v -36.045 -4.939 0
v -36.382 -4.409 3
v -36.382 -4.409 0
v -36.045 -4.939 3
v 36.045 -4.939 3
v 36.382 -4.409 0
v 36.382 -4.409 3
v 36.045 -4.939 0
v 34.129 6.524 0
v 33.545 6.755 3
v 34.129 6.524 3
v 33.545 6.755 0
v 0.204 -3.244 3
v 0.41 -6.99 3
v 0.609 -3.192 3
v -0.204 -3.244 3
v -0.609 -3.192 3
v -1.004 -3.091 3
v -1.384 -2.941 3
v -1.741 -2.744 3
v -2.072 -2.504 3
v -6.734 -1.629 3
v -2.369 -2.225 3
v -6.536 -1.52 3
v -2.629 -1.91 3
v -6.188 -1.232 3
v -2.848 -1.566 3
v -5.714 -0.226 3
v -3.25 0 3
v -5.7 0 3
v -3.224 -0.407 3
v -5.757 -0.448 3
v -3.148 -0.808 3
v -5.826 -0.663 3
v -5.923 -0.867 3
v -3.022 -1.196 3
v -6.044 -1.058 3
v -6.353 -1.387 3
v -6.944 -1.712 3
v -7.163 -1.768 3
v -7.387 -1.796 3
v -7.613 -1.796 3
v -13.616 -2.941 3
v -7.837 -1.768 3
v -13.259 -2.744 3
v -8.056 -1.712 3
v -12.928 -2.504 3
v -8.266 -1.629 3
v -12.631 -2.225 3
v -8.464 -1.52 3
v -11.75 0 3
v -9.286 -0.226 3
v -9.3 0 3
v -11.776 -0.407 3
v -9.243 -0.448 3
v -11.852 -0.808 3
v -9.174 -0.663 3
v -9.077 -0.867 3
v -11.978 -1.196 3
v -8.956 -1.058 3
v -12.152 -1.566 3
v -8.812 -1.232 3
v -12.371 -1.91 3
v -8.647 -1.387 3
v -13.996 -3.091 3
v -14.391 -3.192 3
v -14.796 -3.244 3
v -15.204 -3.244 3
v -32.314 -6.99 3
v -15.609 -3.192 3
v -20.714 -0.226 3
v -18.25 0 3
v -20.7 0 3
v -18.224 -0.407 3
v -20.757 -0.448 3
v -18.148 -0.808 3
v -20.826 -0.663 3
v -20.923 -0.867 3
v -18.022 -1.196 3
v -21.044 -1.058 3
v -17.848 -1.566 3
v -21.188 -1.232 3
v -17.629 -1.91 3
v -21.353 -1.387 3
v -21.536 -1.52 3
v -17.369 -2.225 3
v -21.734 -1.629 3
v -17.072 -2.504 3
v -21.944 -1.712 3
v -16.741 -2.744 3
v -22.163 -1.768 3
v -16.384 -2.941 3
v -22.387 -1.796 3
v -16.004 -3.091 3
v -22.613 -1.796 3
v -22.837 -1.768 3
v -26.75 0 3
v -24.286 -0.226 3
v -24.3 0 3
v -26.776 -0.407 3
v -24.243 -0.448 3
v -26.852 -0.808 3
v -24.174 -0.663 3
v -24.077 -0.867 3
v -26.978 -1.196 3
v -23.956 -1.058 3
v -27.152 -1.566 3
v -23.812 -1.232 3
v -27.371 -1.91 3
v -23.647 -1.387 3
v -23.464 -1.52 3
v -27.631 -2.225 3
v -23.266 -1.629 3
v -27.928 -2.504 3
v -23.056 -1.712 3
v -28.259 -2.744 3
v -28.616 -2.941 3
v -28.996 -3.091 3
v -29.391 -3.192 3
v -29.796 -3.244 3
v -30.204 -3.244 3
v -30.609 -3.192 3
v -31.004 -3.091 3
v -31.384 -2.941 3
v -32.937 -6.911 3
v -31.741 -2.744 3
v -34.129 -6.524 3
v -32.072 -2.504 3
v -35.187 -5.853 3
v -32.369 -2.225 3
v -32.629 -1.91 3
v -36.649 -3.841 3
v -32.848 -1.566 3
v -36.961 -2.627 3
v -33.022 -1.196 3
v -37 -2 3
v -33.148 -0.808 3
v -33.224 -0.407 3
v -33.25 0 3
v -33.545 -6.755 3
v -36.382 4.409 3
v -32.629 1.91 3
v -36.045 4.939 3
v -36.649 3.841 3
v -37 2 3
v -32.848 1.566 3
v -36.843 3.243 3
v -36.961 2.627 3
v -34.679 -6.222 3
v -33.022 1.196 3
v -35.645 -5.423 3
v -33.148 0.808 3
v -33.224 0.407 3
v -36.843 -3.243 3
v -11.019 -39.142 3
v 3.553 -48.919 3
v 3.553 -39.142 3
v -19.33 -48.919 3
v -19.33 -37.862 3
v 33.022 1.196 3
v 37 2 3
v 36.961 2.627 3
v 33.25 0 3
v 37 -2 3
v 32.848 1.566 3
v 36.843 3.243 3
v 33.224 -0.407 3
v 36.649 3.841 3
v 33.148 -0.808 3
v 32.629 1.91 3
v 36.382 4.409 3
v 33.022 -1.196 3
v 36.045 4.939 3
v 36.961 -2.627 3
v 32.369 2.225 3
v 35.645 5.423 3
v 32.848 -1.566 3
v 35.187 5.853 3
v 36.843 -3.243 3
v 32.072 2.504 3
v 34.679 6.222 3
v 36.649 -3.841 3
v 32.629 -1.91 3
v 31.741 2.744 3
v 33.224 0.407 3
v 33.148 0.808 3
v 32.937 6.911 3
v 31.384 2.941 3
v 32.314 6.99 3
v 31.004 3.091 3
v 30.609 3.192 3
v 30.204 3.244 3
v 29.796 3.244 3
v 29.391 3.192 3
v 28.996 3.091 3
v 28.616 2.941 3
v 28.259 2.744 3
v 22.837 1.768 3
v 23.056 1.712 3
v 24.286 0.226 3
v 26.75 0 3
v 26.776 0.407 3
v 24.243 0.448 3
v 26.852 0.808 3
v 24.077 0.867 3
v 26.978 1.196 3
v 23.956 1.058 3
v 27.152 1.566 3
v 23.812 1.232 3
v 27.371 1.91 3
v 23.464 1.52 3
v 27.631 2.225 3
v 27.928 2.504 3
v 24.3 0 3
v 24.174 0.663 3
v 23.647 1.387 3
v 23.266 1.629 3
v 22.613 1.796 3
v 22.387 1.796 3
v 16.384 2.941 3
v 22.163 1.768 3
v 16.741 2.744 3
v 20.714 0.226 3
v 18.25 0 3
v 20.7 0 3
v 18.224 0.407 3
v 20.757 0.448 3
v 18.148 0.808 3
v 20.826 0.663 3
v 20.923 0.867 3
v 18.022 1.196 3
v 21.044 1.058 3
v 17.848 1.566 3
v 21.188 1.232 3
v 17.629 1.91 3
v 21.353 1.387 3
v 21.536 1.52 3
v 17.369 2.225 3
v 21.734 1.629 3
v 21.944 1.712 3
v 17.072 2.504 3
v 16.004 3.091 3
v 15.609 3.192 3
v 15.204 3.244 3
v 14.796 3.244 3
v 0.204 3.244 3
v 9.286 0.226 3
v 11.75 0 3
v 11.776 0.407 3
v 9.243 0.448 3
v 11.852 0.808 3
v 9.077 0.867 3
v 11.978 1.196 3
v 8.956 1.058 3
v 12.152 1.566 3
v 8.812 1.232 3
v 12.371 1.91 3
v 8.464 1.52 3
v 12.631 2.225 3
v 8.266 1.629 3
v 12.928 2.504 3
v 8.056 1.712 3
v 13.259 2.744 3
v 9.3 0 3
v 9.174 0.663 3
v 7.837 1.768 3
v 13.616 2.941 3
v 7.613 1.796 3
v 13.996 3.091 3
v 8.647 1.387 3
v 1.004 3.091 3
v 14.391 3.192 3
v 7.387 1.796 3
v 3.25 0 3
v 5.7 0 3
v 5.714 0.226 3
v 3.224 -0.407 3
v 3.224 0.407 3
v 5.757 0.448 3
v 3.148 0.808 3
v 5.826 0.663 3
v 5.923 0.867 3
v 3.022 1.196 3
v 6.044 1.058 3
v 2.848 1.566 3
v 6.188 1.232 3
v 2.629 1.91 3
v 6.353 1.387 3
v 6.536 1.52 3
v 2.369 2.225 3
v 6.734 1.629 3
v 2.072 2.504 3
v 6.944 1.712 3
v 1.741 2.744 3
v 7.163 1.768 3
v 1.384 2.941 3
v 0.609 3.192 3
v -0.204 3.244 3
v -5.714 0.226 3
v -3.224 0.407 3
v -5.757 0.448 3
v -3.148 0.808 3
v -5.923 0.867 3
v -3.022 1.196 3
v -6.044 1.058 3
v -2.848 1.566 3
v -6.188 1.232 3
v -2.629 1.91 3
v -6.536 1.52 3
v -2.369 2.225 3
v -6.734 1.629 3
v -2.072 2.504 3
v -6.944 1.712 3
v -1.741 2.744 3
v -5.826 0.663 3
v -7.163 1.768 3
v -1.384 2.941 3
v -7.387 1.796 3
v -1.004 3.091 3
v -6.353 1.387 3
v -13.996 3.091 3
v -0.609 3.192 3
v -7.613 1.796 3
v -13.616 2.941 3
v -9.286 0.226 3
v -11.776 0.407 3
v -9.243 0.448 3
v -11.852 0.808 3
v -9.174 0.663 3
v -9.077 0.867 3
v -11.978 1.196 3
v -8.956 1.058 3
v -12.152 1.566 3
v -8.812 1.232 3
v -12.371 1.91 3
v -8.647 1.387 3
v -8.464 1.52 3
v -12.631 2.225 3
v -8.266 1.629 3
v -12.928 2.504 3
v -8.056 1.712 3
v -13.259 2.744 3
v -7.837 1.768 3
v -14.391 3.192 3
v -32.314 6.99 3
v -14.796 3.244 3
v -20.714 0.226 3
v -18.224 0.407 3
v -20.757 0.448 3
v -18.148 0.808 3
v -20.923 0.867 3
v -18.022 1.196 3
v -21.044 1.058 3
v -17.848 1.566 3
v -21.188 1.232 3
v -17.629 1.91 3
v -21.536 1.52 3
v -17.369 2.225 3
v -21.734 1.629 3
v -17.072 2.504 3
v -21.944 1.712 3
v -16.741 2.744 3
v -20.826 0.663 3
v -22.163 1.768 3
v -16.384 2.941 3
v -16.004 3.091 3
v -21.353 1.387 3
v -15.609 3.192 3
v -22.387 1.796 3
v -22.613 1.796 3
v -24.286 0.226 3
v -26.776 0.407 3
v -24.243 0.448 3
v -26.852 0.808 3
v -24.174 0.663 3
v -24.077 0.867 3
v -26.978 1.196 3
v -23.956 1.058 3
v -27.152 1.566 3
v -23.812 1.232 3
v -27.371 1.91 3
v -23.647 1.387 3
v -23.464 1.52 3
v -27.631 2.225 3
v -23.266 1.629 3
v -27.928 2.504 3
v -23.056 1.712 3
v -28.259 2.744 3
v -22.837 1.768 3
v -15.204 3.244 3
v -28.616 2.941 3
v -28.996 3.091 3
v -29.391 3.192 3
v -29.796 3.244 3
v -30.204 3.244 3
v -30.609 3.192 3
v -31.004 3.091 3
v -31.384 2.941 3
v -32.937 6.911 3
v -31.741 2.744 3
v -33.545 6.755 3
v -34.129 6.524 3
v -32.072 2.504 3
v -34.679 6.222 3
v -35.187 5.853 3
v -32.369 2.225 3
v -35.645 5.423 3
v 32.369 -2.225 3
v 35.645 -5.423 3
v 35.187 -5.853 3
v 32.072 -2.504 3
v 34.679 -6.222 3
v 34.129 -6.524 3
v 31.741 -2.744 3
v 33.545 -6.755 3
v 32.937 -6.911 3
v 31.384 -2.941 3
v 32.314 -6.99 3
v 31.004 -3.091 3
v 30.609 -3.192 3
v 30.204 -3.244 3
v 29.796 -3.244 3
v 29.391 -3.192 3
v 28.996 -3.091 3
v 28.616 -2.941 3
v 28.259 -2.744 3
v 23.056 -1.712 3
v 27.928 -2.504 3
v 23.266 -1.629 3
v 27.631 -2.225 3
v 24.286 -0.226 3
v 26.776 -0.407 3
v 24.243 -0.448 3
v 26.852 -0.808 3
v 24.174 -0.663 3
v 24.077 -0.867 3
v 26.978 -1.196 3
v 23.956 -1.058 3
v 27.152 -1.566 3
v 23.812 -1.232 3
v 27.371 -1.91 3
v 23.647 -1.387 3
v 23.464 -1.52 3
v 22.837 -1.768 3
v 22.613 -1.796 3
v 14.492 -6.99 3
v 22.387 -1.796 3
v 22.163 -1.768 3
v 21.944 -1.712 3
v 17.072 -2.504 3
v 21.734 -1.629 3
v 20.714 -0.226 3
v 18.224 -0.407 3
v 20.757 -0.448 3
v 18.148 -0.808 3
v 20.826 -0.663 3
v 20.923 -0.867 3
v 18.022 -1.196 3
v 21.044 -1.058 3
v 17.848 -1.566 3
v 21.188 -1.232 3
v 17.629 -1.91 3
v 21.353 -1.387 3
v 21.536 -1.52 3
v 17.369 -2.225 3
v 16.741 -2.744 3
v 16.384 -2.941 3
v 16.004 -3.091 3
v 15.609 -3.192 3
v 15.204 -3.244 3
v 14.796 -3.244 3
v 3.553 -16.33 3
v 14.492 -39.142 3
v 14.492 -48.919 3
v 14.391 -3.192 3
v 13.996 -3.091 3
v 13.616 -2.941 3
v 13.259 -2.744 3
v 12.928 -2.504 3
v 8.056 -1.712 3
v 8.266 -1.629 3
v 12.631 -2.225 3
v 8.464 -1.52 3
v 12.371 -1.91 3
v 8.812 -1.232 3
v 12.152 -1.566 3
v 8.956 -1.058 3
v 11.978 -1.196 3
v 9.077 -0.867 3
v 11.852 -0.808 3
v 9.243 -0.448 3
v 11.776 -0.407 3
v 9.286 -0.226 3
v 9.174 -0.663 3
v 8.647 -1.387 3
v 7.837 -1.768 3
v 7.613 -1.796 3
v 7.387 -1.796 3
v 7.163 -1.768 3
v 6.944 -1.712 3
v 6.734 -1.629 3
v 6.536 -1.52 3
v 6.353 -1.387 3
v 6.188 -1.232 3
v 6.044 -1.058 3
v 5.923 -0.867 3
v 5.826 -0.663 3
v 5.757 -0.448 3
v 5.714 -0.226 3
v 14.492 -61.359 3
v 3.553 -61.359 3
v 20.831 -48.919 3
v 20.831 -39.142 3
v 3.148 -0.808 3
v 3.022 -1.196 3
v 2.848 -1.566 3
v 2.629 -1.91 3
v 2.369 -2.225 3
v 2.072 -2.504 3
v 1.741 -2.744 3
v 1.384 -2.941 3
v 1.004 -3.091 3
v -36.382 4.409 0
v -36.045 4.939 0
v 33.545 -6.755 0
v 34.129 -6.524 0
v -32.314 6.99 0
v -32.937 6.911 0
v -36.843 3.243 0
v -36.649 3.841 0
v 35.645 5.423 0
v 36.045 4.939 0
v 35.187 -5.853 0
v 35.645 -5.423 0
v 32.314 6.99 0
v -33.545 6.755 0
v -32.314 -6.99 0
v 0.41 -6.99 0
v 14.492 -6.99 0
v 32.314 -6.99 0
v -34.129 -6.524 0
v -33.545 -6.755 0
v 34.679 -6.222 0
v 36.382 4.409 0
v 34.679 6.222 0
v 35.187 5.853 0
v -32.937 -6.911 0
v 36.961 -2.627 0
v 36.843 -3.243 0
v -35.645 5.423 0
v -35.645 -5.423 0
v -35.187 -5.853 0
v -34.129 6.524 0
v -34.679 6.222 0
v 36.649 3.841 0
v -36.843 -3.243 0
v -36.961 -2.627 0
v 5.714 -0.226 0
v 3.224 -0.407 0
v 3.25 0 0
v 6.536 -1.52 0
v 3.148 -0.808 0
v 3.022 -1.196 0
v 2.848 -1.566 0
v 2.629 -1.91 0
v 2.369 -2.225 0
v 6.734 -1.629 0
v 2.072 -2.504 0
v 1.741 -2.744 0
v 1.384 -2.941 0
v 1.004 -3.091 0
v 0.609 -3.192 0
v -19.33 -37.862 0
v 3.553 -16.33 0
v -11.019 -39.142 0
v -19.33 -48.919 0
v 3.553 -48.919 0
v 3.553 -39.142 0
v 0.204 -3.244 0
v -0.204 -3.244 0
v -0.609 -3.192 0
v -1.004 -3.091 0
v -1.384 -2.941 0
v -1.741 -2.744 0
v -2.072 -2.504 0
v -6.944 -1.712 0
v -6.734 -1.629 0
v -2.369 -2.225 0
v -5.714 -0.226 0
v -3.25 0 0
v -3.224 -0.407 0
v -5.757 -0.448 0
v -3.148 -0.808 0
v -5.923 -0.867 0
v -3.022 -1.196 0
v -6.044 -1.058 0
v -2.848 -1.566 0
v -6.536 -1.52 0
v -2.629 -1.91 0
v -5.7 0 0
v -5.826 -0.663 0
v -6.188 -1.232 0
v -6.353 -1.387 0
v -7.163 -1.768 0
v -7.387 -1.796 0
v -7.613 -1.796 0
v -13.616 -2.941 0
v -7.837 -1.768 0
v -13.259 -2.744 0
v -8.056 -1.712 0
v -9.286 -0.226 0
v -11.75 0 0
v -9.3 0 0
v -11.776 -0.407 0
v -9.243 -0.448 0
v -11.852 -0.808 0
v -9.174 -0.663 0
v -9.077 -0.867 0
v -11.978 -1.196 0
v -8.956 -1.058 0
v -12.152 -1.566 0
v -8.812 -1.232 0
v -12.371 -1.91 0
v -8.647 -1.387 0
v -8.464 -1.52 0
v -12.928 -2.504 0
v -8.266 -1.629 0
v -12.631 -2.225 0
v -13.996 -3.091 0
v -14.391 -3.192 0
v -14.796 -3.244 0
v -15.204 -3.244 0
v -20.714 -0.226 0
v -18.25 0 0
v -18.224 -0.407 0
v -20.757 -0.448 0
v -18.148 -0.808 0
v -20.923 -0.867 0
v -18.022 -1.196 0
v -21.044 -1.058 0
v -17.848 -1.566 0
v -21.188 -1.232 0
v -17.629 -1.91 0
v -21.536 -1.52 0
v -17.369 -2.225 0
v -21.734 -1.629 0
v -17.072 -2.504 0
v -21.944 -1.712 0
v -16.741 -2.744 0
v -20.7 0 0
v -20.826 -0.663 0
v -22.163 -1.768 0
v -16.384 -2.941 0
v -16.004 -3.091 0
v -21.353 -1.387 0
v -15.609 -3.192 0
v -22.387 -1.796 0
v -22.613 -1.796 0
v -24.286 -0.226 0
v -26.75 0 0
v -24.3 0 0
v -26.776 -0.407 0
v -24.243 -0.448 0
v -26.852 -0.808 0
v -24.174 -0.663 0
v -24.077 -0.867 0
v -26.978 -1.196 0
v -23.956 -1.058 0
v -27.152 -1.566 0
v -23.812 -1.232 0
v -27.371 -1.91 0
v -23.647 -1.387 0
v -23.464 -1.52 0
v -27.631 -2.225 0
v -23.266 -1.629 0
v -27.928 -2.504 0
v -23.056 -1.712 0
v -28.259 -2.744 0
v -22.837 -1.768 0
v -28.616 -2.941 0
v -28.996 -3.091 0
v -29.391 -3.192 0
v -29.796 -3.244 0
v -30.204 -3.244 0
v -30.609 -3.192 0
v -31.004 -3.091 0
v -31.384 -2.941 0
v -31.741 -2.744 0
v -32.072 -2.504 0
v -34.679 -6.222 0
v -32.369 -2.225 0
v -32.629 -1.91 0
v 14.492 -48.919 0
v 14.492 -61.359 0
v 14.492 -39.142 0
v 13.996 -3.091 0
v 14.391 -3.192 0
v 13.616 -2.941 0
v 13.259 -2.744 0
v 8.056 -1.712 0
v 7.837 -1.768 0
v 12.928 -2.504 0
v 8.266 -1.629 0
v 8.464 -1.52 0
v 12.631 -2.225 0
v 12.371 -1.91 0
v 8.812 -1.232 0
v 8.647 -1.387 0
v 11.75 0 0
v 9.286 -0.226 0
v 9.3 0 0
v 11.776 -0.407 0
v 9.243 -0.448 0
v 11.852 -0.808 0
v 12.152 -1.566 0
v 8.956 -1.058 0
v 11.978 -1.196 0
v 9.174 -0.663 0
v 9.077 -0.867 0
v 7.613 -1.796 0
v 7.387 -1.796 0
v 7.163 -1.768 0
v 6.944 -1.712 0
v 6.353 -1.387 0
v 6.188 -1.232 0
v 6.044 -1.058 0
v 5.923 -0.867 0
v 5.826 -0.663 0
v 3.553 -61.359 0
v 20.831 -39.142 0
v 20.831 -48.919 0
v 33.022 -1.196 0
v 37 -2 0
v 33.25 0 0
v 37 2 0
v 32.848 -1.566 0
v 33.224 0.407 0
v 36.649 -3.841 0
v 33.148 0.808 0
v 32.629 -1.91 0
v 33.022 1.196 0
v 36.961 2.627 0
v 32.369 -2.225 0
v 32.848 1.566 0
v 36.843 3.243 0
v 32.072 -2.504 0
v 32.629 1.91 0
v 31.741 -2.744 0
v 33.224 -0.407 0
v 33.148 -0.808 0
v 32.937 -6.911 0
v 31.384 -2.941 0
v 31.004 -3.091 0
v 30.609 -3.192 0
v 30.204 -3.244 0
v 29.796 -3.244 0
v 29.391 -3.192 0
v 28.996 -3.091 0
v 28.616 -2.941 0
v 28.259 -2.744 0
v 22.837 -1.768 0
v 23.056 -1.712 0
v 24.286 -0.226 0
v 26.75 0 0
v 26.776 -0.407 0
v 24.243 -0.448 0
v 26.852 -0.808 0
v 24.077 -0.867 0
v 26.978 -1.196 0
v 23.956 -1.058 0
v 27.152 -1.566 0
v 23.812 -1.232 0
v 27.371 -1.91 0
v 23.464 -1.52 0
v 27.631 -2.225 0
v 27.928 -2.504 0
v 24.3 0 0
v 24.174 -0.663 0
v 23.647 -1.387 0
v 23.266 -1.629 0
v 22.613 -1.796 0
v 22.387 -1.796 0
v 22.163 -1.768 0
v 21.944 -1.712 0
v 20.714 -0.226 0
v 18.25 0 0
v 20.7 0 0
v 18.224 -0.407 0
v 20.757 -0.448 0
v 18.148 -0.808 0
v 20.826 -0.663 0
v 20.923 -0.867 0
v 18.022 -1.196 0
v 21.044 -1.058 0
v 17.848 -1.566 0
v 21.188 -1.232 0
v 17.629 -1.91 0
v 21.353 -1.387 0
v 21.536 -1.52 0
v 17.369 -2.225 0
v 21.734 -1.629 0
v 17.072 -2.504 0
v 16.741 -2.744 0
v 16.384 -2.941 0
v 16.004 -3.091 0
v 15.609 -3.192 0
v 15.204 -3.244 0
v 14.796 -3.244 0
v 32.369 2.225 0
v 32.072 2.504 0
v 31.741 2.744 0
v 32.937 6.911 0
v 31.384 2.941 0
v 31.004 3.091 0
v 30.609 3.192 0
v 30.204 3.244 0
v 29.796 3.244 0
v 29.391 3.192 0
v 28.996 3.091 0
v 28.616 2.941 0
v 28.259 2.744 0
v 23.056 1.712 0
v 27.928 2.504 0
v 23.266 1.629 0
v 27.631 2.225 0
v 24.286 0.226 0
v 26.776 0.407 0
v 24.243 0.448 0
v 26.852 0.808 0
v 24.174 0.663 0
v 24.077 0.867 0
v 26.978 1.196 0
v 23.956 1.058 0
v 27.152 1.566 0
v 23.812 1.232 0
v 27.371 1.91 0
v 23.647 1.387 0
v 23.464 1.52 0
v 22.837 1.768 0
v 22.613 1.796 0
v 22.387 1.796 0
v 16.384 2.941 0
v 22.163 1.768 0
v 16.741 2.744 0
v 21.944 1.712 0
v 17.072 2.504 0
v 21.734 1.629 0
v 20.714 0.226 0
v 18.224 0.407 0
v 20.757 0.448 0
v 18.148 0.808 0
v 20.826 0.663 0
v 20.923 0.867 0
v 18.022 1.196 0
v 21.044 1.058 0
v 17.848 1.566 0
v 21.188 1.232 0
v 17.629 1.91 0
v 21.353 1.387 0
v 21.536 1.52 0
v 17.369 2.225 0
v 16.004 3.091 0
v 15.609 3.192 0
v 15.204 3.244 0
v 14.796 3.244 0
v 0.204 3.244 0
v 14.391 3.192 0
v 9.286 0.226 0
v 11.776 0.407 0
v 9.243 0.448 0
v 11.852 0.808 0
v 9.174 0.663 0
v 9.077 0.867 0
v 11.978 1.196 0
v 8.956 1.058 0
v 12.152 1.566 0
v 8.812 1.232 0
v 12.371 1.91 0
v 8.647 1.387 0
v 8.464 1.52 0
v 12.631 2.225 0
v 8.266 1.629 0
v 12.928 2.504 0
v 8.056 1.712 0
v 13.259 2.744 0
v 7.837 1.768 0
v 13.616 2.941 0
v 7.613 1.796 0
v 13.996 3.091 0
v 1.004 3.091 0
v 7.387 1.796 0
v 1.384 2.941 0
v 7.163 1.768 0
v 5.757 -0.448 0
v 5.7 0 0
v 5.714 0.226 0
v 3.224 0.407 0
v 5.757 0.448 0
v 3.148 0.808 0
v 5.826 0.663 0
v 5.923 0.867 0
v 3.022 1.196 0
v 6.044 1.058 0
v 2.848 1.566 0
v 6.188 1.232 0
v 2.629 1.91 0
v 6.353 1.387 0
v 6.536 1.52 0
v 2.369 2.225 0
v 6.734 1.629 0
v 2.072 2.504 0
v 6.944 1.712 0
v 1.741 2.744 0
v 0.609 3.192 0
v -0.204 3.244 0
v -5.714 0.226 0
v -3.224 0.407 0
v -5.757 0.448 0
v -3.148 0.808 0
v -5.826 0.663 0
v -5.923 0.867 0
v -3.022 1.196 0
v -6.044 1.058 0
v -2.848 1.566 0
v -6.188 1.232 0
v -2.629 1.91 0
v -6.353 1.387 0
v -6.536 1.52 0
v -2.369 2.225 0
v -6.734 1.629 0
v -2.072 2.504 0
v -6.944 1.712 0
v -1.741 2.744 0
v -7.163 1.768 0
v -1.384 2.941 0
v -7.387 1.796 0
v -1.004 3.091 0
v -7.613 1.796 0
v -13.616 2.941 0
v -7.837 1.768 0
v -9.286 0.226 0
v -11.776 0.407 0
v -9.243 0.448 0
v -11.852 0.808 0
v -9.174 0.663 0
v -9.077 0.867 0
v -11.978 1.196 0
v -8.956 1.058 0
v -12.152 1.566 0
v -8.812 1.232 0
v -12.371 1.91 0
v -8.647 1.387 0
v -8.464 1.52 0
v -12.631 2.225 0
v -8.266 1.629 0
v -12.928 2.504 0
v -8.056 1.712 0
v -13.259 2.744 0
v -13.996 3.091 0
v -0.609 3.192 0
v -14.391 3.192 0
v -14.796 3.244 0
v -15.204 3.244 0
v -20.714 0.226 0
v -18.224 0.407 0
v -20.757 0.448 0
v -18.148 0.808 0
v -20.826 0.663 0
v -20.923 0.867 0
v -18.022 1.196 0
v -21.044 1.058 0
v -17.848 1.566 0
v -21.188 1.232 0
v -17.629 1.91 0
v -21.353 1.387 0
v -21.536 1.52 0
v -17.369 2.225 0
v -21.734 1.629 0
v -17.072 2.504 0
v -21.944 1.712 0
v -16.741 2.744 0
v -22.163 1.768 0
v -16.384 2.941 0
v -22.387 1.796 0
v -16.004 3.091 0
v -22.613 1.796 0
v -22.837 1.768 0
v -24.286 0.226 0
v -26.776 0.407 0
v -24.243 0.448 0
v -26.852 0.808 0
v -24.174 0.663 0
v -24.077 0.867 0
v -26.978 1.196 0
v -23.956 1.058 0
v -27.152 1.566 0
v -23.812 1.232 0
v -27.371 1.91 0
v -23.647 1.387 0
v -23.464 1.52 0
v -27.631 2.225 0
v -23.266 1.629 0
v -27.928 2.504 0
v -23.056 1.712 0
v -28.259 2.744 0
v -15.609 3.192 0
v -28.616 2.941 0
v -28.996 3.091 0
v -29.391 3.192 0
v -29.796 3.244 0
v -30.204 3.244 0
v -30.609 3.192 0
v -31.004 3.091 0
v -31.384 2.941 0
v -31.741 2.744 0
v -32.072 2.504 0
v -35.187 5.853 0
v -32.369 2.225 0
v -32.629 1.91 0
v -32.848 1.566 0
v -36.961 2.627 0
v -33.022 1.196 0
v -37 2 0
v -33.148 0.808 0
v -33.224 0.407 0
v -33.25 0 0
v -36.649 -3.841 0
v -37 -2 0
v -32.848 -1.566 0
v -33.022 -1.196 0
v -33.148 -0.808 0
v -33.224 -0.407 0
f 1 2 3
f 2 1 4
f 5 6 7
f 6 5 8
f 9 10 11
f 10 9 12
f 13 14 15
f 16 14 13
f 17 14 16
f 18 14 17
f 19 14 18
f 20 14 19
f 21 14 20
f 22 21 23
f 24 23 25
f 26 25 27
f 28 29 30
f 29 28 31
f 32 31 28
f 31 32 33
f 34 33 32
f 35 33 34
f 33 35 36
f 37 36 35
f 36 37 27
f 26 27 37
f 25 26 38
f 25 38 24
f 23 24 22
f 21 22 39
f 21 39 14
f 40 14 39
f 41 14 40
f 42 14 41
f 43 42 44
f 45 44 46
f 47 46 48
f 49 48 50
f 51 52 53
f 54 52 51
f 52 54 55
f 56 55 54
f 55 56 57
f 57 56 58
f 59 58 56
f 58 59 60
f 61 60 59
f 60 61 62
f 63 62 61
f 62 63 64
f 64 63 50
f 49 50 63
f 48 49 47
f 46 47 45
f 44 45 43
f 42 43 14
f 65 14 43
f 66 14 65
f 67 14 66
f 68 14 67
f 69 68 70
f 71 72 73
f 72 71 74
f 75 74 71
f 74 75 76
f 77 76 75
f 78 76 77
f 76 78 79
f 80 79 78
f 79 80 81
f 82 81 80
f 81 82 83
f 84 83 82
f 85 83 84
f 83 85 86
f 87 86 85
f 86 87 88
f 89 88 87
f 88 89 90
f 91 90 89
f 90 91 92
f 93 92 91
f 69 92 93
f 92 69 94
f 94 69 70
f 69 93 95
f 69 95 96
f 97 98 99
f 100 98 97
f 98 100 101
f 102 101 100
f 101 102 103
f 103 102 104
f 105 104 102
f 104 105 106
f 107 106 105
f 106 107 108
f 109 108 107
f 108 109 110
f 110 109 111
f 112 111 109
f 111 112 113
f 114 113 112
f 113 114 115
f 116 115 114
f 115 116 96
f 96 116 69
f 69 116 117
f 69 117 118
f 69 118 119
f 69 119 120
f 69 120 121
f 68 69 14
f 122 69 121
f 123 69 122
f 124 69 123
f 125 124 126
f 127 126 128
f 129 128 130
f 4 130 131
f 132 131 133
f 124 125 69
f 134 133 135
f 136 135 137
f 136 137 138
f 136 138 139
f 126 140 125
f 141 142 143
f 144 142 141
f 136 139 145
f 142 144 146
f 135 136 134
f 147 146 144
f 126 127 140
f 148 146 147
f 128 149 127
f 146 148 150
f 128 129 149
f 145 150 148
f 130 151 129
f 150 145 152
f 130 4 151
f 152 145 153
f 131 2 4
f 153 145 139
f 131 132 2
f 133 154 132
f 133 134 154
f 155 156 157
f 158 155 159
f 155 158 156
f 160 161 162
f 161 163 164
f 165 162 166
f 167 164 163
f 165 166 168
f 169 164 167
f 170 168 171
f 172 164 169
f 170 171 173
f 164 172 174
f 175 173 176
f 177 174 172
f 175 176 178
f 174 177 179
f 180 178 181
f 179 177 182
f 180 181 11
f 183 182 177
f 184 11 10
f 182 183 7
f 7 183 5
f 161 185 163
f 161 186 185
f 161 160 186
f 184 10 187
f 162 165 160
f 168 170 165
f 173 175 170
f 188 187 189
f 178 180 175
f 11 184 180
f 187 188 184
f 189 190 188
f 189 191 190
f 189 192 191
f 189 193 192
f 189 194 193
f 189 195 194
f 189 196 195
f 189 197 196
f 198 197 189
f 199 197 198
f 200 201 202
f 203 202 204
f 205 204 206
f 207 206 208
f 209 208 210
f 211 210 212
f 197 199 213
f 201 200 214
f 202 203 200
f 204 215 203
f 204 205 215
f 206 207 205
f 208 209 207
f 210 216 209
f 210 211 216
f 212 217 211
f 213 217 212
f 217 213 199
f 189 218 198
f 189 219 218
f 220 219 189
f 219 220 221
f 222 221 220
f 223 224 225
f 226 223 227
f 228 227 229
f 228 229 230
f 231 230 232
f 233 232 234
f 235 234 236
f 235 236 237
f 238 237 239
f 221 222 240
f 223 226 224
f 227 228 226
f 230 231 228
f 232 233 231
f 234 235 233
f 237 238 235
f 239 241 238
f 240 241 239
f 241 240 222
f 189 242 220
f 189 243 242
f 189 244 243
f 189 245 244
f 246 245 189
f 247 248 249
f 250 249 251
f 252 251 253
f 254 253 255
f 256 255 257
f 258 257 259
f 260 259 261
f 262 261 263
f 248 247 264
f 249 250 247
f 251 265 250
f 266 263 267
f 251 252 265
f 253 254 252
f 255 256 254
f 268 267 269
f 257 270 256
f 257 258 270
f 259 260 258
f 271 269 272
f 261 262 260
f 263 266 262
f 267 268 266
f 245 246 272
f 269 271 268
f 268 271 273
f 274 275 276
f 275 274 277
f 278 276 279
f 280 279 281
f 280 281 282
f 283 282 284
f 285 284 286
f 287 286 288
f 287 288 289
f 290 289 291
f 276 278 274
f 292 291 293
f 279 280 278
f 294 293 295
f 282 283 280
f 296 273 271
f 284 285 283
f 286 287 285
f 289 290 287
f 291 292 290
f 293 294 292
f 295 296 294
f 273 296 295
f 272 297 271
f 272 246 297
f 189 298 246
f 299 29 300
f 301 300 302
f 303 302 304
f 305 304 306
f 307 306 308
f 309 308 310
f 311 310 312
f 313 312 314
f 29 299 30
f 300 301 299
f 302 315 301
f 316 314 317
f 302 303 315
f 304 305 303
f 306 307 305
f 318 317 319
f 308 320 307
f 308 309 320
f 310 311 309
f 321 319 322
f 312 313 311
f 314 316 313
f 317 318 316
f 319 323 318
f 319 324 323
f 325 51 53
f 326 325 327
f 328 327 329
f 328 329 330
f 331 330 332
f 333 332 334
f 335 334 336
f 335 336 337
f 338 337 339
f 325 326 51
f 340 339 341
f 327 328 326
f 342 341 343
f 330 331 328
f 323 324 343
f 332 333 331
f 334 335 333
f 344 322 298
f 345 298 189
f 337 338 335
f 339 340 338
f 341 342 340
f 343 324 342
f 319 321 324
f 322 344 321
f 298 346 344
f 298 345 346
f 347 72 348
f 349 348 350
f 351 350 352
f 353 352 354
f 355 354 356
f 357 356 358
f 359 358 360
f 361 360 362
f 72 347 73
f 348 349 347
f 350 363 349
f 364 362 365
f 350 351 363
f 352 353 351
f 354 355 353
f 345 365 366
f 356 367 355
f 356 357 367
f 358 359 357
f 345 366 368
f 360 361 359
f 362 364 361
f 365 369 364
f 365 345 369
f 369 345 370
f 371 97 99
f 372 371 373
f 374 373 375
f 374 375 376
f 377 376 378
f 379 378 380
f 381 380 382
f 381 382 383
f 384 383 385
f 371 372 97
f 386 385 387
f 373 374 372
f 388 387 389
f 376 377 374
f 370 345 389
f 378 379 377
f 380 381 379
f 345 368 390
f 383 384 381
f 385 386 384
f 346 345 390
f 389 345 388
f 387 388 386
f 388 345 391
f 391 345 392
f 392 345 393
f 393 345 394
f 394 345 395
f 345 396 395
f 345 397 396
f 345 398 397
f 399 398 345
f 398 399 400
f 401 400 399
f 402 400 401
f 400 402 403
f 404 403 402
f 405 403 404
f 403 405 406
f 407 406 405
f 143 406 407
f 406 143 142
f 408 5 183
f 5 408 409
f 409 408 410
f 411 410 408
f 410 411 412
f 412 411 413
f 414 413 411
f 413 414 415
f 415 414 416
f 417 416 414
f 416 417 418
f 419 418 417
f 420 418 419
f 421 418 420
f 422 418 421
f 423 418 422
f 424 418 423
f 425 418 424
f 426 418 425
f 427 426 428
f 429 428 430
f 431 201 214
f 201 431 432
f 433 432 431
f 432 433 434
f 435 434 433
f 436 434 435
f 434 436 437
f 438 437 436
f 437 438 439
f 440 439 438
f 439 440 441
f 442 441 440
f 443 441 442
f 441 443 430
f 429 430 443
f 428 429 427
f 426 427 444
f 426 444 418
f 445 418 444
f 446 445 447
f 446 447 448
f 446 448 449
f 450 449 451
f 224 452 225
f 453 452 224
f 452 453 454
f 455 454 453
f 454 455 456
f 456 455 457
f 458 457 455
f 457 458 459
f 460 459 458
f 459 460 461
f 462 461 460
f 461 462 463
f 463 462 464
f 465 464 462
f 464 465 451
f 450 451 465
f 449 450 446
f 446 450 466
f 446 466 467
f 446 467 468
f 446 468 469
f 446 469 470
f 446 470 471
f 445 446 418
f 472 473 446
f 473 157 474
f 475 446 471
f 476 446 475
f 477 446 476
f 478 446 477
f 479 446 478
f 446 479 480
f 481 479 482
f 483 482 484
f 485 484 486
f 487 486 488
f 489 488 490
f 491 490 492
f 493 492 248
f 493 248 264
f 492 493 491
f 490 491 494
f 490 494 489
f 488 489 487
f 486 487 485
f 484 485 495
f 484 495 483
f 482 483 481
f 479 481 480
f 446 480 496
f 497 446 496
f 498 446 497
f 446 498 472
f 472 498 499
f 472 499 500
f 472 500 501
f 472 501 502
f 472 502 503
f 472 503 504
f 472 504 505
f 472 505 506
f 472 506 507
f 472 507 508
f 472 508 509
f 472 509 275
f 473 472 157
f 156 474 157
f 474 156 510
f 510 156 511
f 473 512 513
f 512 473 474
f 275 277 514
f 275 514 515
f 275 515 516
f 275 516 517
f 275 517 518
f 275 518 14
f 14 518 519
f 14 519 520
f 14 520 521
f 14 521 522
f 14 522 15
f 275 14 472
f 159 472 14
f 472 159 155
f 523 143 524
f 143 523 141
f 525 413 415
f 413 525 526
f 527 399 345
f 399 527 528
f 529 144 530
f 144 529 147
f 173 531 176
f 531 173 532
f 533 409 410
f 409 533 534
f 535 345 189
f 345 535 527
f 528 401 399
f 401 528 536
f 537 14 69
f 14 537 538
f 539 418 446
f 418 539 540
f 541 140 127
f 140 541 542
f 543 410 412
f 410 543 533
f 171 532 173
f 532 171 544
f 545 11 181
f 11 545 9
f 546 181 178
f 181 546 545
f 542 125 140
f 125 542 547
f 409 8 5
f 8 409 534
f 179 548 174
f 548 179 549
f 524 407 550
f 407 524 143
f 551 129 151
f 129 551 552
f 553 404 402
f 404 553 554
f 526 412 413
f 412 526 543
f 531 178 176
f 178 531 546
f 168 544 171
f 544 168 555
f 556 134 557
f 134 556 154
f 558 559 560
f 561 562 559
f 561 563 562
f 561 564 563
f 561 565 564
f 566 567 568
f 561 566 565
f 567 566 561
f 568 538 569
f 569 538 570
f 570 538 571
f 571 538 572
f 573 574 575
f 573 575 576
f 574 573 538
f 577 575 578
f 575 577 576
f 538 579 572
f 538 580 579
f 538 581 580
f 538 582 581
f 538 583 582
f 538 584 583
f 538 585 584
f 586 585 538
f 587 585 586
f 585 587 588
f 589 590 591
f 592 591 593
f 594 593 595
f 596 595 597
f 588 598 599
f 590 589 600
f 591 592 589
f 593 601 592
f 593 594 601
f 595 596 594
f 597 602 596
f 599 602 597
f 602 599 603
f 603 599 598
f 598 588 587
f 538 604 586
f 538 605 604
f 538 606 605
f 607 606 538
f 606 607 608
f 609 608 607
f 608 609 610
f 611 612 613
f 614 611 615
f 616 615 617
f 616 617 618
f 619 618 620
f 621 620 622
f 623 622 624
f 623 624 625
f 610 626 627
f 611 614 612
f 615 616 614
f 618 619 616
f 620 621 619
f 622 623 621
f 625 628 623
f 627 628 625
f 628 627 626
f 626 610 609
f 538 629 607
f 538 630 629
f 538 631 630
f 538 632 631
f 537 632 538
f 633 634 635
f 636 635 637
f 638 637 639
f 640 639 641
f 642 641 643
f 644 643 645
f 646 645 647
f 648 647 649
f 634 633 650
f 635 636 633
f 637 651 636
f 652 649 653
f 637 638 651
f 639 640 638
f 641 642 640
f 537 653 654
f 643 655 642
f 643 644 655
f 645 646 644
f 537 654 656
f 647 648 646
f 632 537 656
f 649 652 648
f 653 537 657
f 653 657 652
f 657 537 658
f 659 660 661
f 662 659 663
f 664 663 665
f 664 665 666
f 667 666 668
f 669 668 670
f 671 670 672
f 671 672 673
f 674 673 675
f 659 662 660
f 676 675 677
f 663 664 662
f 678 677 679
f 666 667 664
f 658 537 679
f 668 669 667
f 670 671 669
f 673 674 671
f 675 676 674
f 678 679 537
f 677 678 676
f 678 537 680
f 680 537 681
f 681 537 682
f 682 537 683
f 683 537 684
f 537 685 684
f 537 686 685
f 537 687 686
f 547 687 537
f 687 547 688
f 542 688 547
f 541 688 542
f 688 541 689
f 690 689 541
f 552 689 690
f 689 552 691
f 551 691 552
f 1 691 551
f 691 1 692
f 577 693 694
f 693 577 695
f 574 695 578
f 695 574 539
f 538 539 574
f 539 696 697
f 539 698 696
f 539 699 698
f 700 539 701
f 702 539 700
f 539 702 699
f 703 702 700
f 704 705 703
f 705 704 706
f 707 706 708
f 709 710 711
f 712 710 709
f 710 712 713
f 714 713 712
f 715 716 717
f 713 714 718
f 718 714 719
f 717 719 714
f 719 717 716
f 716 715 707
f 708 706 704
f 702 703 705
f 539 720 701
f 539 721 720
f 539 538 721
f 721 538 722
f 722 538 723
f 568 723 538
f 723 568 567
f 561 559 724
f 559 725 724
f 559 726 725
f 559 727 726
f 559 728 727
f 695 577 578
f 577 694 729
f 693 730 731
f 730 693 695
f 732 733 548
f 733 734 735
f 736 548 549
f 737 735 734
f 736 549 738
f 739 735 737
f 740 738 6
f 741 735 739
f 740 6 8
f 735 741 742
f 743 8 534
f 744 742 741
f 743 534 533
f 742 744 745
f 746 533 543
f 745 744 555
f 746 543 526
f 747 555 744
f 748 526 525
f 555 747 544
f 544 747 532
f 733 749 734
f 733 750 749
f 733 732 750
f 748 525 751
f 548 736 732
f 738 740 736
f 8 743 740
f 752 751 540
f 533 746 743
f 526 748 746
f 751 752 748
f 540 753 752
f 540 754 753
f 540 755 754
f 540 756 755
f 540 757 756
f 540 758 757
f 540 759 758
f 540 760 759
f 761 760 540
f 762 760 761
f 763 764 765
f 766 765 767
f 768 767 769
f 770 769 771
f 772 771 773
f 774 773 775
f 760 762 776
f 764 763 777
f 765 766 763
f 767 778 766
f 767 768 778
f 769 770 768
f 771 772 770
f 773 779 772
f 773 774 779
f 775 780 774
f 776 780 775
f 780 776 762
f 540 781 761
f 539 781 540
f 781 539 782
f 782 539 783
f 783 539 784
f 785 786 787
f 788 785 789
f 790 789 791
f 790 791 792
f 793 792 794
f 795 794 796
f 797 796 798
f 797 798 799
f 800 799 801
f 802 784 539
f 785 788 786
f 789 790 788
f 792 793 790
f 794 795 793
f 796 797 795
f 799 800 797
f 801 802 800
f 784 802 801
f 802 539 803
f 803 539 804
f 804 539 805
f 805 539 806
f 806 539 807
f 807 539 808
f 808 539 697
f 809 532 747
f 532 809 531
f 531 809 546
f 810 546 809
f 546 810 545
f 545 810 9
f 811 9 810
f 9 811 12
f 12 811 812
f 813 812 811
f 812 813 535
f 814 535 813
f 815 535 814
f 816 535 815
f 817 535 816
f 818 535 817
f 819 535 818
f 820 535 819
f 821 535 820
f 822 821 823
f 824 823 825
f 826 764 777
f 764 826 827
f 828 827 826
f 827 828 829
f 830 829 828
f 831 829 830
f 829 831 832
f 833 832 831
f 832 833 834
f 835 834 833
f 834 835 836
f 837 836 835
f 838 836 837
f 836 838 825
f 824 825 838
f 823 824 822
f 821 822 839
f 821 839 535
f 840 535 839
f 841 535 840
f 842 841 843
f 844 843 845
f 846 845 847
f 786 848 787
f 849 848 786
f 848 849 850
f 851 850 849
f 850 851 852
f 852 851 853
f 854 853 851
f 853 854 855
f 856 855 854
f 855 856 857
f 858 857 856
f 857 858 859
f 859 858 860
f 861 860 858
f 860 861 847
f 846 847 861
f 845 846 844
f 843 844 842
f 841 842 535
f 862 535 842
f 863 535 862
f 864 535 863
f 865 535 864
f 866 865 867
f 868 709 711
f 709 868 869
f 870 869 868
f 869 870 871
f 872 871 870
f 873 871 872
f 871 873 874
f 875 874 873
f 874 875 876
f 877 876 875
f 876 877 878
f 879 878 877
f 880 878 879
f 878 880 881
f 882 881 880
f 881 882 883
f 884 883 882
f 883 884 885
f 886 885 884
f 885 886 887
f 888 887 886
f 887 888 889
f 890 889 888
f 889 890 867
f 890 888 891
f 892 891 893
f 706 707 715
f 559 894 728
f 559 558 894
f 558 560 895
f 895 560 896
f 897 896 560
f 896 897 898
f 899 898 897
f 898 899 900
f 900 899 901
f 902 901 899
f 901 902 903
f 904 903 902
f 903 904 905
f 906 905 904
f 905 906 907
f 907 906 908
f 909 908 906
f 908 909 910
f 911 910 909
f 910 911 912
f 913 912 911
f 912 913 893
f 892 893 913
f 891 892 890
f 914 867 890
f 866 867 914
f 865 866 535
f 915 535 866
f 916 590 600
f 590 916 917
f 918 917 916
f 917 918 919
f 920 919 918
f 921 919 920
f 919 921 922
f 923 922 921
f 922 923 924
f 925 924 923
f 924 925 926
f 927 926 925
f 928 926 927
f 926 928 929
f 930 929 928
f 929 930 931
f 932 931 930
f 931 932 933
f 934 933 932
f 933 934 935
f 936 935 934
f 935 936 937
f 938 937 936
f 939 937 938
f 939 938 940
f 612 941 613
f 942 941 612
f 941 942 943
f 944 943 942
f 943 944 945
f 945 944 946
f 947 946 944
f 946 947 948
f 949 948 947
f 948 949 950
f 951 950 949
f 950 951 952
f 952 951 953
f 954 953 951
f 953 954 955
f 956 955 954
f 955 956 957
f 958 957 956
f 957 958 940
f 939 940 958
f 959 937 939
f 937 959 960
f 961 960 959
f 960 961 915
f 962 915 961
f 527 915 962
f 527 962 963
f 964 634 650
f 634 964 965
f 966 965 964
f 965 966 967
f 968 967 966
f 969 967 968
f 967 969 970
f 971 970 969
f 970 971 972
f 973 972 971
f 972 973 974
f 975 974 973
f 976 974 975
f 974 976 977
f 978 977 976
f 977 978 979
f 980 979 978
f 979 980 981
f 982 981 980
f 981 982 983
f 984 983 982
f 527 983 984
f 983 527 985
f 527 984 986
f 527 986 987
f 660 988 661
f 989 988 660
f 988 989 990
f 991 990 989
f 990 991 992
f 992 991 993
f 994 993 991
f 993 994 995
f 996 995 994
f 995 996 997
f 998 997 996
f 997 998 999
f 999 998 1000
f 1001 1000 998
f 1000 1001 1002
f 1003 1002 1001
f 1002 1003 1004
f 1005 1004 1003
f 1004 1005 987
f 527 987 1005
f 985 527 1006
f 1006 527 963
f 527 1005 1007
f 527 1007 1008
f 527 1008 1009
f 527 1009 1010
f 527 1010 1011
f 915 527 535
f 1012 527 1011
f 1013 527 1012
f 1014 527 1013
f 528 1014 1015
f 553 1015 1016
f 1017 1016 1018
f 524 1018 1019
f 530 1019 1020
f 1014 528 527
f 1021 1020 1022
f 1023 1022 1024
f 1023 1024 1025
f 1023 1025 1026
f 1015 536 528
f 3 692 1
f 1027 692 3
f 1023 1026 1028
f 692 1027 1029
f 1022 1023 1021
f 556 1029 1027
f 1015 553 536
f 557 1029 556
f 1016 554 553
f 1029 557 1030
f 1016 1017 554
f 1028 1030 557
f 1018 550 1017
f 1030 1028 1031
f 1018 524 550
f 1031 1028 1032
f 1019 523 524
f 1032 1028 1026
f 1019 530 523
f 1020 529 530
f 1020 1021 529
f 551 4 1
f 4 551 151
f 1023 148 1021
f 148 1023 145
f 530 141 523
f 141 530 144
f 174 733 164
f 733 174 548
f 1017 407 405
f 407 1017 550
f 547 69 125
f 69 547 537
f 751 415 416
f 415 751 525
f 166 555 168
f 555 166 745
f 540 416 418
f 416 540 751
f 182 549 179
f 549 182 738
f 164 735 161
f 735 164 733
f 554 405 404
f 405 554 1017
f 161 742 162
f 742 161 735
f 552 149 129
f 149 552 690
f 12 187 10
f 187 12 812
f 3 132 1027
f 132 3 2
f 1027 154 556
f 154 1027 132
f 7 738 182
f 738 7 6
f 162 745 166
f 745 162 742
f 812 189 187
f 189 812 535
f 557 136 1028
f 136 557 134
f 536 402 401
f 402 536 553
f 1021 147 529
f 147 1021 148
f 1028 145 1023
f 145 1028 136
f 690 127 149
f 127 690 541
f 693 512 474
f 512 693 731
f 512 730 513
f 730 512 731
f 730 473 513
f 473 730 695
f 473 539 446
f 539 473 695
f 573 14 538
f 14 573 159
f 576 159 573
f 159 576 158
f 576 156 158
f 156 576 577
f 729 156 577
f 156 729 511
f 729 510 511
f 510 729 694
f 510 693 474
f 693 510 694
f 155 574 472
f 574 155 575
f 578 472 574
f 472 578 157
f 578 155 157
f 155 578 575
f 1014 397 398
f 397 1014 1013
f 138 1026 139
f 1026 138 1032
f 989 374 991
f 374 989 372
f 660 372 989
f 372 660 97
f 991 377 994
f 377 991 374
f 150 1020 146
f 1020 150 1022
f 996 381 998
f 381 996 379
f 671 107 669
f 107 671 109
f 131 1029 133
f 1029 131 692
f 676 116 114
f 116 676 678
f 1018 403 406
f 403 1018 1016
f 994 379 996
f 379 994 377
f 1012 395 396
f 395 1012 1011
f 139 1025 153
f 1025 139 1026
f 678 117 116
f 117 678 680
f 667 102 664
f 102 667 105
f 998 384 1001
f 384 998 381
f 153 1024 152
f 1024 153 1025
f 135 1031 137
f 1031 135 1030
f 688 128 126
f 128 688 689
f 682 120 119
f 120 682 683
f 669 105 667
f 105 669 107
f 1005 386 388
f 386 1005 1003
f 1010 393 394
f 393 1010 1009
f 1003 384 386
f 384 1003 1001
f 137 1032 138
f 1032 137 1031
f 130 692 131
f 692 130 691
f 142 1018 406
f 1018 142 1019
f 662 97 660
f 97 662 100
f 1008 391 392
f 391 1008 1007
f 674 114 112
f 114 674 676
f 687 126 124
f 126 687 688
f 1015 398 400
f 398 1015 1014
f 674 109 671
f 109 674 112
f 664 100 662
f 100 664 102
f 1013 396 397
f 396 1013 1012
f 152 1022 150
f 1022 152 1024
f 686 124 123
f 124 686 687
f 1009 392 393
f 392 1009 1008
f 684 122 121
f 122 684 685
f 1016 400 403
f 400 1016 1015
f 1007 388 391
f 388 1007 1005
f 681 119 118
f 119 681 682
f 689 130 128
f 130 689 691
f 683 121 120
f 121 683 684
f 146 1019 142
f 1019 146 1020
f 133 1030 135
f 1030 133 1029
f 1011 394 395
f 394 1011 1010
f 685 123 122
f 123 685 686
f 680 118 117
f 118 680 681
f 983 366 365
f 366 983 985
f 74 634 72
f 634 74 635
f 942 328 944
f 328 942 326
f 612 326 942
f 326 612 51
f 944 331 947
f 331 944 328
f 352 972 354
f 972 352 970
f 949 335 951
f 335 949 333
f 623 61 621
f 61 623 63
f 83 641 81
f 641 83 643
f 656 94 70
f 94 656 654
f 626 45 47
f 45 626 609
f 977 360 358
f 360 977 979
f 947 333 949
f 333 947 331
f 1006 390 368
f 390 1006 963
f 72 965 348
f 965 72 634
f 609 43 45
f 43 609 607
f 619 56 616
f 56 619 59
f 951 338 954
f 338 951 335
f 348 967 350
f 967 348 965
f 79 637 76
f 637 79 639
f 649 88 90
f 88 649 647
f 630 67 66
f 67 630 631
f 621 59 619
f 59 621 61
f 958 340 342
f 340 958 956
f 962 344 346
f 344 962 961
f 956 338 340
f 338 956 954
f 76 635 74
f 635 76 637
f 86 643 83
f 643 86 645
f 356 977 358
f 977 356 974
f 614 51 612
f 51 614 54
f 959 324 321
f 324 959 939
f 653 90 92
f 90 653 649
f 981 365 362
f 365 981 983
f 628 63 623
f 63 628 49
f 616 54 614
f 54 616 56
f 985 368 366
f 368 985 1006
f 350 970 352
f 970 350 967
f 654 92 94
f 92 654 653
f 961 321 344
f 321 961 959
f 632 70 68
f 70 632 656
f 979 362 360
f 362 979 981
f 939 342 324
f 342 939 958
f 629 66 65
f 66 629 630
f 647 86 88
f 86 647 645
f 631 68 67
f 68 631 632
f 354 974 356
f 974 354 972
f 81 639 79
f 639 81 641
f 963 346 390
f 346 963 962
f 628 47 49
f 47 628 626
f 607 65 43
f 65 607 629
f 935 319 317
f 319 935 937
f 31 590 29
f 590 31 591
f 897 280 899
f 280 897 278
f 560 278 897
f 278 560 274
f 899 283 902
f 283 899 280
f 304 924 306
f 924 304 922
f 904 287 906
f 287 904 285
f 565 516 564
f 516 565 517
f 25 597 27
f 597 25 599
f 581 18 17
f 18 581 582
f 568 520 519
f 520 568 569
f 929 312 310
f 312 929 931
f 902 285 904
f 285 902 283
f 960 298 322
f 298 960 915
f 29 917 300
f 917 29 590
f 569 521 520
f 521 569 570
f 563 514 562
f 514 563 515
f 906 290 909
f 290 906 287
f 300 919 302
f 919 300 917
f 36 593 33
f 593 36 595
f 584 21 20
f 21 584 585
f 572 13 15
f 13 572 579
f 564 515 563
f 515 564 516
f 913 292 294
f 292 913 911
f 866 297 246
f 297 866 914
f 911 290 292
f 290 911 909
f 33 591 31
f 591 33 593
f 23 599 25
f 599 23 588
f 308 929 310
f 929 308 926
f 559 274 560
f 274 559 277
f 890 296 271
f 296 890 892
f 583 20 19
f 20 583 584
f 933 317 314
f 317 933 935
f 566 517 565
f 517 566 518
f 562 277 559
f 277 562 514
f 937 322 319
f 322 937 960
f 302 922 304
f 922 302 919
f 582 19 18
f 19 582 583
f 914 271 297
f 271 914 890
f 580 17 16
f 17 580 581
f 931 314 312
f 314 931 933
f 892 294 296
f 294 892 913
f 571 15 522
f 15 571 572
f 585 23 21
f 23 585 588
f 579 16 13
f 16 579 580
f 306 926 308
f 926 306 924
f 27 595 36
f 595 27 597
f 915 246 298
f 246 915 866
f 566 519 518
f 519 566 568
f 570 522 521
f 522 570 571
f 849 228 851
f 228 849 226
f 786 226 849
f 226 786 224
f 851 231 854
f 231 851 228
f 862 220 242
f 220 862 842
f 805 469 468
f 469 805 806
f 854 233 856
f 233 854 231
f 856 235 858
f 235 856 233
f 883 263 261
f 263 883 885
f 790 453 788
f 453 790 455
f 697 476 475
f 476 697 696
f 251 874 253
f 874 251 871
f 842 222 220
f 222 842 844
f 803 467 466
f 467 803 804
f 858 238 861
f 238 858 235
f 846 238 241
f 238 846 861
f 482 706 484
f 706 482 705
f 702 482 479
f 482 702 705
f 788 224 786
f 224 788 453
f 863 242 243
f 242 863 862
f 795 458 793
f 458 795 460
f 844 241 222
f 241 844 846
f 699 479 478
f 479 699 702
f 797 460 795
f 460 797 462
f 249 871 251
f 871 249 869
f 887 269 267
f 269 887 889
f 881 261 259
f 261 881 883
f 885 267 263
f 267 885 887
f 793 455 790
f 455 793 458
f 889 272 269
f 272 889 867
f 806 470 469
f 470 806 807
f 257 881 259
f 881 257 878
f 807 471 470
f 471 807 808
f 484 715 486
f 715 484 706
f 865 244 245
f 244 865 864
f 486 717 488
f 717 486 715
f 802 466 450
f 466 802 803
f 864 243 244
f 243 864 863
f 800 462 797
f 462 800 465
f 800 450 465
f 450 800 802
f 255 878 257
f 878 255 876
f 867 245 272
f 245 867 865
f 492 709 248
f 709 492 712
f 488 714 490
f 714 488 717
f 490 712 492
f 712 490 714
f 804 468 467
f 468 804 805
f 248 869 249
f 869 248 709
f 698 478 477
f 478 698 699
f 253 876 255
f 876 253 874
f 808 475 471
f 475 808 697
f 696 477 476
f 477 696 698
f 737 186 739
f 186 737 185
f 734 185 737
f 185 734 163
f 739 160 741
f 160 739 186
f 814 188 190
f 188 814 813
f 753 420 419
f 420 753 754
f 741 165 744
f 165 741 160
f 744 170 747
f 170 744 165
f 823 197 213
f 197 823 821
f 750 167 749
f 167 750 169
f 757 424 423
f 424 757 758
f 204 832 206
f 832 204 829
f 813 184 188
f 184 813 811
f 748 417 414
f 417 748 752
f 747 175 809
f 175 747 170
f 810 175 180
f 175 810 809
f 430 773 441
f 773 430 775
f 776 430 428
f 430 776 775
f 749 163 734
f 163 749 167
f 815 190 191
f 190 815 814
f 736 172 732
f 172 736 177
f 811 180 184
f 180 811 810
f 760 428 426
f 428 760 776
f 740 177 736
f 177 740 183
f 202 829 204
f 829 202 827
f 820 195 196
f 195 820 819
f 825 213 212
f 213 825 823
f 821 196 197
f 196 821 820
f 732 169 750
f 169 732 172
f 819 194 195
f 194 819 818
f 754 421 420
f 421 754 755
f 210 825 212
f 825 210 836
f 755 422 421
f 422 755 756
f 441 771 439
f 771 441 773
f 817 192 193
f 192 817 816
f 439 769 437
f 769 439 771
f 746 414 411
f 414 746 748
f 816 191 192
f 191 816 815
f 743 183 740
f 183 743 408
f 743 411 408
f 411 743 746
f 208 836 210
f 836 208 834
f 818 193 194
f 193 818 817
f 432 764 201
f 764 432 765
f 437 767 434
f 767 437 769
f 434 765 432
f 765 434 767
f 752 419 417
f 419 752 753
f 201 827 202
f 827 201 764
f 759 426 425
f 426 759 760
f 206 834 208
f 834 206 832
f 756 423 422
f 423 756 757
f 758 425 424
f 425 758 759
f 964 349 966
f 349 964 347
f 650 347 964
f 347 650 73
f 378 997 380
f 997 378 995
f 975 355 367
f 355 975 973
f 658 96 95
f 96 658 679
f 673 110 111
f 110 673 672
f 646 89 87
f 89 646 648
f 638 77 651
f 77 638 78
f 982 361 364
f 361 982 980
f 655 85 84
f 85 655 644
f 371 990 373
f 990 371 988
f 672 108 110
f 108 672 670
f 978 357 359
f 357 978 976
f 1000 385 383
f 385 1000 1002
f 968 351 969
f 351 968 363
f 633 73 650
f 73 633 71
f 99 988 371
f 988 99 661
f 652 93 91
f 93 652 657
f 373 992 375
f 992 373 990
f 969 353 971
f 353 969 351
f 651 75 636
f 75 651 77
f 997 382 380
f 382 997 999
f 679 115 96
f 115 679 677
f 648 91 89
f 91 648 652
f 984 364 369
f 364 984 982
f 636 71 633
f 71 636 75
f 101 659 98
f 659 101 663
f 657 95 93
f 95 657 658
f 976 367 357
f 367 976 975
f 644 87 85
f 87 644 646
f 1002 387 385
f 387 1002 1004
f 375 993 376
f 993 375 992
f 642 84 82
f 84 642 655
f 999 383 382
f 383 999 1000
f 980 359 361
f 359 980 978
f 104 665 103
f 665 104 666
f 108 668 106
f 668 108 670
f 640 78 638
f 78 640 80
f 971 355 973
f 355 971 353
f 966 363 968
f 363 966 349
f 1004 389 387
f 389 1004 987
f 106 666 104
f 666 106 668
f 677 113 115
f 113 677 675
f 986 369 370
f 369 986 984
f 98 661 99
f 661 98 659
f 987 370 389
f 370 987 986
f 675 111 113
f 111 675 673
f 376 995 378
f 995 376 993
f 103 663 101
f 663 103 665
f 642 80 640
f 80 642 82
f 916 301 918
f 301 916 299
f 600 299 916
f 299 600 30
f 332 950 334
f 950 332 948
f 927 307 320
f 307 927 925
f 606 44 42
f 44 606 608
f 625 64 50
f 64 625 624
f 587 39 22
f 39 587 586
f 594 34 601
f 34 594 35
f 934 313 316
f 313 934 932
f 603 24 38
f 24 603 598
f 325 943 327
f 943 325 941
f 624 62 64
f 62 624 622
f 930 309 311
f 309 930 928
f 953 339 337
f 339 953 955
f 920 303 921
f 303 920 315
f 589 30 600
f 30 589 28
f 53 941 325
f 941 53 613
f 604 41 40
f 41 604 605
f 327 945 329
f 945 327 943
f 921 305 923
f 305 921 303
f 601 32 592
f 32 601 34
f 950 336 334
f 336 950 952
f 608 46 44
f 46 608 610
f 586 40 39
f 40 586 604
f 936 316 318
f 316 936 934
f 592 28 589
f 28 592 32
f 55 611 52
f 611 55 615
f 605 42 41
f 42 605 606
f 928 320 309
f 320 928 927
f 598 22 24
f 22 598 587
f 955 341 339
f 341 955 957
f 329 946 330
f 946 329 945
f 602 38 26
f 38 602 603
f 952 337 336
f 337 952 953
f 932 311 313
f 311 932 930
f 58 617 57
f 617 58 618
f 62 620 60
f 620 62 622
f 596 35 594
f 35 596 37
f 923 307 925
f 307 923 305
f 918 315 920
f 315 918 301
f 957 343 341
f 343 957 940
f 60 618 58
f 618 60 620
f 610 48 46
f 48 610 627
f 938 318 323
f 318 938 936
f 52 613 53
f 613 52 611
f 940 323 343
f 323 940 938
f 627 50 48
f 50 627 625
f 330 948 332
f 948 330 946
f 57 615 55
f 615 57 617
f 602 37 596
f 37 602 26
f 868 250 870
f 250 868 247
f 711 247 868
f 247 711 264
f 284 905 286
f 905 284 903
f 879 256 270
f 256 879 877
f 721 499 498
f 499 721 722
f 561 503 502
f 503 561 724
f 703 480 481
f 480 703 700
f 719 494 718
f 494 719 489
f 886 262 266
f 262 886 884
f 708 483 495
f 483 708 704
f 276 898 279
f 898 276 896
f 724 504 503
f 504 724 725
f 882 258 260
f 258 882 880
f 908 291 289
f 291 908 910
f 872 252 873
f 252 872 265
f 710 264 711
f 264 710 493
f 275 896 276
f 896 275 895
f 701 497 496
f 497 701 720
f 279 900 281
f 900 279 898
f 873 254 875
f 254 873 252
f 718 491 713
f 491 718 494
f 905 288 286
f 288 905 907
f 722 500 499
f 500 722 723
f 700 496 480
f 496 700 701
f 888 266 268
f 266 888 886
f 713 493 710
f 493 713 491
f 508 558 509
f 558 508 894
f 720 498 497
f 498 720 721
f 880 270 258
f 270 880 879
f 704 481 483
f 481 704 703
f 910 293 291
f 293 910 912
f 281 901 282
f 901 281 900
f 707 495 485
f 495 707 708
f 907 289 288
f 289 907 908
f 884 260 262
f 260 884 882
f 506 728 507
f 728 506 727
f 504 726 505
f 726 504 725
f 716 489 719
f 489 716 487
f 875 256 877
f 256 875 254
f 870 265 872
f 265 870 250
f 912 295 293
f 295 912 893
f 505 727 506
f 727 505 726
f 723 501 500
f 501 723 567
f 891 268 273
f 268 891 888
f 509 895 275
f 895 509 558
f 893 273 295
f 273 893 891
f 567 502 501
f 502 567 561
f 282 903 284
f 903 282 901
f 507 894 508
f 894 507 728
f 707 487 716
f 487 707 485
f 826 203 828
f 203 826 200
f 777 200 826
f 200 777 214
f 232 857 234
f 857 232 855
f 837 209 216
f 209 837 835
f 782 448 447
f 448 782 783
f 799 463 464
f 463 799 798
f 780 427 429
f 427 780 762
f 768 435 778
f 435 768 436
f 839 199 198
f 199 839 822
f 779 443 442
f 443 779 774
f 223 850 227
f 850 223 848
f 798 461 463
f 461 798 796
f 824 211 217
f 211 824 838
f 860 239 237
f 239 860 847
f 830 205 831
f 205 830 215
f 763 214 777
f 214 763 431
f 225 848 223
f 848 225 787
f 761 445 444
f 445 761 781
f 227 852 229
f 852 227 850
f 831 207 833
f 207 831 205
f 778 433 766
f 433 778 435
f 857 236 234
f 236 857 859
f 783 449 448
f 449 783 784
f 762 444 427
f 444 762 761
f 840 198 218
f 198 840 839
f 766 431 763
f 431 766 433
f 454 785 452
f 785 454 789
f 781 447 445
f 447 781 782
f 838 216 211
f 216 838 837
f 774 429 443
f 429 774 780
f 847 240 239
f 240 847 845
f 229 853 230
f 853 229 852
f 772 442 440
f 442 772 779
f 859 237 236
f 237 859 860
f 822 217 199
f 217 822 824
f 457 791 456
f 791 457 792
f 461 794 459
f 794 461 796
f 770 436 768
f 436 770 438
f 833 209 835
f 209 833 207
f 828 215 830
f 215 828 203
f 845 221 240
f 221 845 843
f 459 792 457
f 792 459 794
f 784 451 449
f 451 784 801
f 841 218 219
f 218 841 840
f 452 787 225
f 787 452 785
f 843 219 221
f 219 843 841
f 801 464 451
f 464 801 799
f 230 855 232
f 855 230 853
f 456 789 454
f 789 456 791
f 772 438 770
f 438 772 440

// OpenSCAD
$fn = 50;


difference() {
	union() {
		hull() {
			translate(v = [-32.0000000000, 2.0000000000, 0]) {
				cylinder(h = 3, r = 5);
			}
			translate(v = [32.0000000000, 2.0000000000, 0]) {
				cylinder(h = 3, r = 5);
			}
			translate(v = [-32.0000000000, -2.0000000000, 0]) {
				cylinder(h = 3, r = 5);
			}
			translate(v = [32.0000000000, -2.0000000000, 0]) {
				cylinder(h = 3, r = 5);
			}
		}
		translate(v = [0, -5, 0]) {
			linear_extrude(height = 3) {
				text(font = "DejaVu Sans Mono:style=Bold", halign = "center", size = 57.0000000000, text = "4", valign = "top");
			}
		}
	}
	union() {
		translate(v = [-30.0000000000, 0.0000000000, 0]) {
			translate(v = [0, 0, -100]) {
				cylinder(h = 200, r = 3.2500000000);
			}
		}
		translate(v = [-15.0000000000, 0.0000000000, 0]) {
			translate(v = [0, 0, -100]) {
				cylinder(h = 200, r = 3.2500000000);
			}
		}
		translate(v = [0, 0, -100]) {
			cylinder(h = 200, r = 3.2500000000);
		}
		translate(v = [15.0000000000, 0.0000000000, 0]) {
			translate(v = [0, 0, -100]) {
				cylinder(h = 200, r = 3.2500000000);
			}
		}
		translate(v = [30.0000000000, 0.0000000000, 0]) {
			translate(v = [0, 0, -100]) {
				cylinder(h = 200, r = 3.2500000000);
			}
		}
		translate(v = [-30.0000000000, 0.0000000000, 0]) {
			translate(v = [0, 0, -100]) {
				cylinder(h = 200, r = 1.8000000000);
			}
		}
		translate(v = [-22.5000000000, 0.0000000000, 0]) {
			translate(v = [0, 0, -100]) {
				cylinder(h = 200, r = 1.8000000000);
			}
		}
		translate(v = [-15.0000000000, 0.0000000000, 0]) {
			translate(v = [0, 0, -100]) {
				cylinder(h = 200, r = 1.8000000000);
			}
		}
		translate(v = [-7.5000000000, 0.0000000000, 0]) {
			translate(v = [0, 0, -100]) {
				cylinder(h = 200, r = 1.8000000000);
			}
		}
		translate(v = [0, 0, -100]) {
			cylinder(h = 200, r = 1.8000000000);
		}
		translate(v = [7.5000000000, 0.0000000000, 0]) {
			translate(v = [0, 0, -100]) {
				cylinder(h = 200, r = 1.8000000000);
			}
		}
		translate(v = [15.0000000000, 0.0000000000, 0]) {
			translate(v = [0, 0, -100]) {
				cylinder(h = 200, r = 1.8000000000);
			}
		}
		translate(v = [22.5000000000, 0.0000000000, 0]) {
			translate(v = [0, 0, -100]) {
				cylinder(h = 200, r = 1.8000000000);
			}
		}
		translate(v = [30.0000000000, 0.0000000000, 0]) {
			translate(v = [0, 0, -100]) {
				cylinder(h = 200, r = 1.8000000000);
			}
		}
	}
}
